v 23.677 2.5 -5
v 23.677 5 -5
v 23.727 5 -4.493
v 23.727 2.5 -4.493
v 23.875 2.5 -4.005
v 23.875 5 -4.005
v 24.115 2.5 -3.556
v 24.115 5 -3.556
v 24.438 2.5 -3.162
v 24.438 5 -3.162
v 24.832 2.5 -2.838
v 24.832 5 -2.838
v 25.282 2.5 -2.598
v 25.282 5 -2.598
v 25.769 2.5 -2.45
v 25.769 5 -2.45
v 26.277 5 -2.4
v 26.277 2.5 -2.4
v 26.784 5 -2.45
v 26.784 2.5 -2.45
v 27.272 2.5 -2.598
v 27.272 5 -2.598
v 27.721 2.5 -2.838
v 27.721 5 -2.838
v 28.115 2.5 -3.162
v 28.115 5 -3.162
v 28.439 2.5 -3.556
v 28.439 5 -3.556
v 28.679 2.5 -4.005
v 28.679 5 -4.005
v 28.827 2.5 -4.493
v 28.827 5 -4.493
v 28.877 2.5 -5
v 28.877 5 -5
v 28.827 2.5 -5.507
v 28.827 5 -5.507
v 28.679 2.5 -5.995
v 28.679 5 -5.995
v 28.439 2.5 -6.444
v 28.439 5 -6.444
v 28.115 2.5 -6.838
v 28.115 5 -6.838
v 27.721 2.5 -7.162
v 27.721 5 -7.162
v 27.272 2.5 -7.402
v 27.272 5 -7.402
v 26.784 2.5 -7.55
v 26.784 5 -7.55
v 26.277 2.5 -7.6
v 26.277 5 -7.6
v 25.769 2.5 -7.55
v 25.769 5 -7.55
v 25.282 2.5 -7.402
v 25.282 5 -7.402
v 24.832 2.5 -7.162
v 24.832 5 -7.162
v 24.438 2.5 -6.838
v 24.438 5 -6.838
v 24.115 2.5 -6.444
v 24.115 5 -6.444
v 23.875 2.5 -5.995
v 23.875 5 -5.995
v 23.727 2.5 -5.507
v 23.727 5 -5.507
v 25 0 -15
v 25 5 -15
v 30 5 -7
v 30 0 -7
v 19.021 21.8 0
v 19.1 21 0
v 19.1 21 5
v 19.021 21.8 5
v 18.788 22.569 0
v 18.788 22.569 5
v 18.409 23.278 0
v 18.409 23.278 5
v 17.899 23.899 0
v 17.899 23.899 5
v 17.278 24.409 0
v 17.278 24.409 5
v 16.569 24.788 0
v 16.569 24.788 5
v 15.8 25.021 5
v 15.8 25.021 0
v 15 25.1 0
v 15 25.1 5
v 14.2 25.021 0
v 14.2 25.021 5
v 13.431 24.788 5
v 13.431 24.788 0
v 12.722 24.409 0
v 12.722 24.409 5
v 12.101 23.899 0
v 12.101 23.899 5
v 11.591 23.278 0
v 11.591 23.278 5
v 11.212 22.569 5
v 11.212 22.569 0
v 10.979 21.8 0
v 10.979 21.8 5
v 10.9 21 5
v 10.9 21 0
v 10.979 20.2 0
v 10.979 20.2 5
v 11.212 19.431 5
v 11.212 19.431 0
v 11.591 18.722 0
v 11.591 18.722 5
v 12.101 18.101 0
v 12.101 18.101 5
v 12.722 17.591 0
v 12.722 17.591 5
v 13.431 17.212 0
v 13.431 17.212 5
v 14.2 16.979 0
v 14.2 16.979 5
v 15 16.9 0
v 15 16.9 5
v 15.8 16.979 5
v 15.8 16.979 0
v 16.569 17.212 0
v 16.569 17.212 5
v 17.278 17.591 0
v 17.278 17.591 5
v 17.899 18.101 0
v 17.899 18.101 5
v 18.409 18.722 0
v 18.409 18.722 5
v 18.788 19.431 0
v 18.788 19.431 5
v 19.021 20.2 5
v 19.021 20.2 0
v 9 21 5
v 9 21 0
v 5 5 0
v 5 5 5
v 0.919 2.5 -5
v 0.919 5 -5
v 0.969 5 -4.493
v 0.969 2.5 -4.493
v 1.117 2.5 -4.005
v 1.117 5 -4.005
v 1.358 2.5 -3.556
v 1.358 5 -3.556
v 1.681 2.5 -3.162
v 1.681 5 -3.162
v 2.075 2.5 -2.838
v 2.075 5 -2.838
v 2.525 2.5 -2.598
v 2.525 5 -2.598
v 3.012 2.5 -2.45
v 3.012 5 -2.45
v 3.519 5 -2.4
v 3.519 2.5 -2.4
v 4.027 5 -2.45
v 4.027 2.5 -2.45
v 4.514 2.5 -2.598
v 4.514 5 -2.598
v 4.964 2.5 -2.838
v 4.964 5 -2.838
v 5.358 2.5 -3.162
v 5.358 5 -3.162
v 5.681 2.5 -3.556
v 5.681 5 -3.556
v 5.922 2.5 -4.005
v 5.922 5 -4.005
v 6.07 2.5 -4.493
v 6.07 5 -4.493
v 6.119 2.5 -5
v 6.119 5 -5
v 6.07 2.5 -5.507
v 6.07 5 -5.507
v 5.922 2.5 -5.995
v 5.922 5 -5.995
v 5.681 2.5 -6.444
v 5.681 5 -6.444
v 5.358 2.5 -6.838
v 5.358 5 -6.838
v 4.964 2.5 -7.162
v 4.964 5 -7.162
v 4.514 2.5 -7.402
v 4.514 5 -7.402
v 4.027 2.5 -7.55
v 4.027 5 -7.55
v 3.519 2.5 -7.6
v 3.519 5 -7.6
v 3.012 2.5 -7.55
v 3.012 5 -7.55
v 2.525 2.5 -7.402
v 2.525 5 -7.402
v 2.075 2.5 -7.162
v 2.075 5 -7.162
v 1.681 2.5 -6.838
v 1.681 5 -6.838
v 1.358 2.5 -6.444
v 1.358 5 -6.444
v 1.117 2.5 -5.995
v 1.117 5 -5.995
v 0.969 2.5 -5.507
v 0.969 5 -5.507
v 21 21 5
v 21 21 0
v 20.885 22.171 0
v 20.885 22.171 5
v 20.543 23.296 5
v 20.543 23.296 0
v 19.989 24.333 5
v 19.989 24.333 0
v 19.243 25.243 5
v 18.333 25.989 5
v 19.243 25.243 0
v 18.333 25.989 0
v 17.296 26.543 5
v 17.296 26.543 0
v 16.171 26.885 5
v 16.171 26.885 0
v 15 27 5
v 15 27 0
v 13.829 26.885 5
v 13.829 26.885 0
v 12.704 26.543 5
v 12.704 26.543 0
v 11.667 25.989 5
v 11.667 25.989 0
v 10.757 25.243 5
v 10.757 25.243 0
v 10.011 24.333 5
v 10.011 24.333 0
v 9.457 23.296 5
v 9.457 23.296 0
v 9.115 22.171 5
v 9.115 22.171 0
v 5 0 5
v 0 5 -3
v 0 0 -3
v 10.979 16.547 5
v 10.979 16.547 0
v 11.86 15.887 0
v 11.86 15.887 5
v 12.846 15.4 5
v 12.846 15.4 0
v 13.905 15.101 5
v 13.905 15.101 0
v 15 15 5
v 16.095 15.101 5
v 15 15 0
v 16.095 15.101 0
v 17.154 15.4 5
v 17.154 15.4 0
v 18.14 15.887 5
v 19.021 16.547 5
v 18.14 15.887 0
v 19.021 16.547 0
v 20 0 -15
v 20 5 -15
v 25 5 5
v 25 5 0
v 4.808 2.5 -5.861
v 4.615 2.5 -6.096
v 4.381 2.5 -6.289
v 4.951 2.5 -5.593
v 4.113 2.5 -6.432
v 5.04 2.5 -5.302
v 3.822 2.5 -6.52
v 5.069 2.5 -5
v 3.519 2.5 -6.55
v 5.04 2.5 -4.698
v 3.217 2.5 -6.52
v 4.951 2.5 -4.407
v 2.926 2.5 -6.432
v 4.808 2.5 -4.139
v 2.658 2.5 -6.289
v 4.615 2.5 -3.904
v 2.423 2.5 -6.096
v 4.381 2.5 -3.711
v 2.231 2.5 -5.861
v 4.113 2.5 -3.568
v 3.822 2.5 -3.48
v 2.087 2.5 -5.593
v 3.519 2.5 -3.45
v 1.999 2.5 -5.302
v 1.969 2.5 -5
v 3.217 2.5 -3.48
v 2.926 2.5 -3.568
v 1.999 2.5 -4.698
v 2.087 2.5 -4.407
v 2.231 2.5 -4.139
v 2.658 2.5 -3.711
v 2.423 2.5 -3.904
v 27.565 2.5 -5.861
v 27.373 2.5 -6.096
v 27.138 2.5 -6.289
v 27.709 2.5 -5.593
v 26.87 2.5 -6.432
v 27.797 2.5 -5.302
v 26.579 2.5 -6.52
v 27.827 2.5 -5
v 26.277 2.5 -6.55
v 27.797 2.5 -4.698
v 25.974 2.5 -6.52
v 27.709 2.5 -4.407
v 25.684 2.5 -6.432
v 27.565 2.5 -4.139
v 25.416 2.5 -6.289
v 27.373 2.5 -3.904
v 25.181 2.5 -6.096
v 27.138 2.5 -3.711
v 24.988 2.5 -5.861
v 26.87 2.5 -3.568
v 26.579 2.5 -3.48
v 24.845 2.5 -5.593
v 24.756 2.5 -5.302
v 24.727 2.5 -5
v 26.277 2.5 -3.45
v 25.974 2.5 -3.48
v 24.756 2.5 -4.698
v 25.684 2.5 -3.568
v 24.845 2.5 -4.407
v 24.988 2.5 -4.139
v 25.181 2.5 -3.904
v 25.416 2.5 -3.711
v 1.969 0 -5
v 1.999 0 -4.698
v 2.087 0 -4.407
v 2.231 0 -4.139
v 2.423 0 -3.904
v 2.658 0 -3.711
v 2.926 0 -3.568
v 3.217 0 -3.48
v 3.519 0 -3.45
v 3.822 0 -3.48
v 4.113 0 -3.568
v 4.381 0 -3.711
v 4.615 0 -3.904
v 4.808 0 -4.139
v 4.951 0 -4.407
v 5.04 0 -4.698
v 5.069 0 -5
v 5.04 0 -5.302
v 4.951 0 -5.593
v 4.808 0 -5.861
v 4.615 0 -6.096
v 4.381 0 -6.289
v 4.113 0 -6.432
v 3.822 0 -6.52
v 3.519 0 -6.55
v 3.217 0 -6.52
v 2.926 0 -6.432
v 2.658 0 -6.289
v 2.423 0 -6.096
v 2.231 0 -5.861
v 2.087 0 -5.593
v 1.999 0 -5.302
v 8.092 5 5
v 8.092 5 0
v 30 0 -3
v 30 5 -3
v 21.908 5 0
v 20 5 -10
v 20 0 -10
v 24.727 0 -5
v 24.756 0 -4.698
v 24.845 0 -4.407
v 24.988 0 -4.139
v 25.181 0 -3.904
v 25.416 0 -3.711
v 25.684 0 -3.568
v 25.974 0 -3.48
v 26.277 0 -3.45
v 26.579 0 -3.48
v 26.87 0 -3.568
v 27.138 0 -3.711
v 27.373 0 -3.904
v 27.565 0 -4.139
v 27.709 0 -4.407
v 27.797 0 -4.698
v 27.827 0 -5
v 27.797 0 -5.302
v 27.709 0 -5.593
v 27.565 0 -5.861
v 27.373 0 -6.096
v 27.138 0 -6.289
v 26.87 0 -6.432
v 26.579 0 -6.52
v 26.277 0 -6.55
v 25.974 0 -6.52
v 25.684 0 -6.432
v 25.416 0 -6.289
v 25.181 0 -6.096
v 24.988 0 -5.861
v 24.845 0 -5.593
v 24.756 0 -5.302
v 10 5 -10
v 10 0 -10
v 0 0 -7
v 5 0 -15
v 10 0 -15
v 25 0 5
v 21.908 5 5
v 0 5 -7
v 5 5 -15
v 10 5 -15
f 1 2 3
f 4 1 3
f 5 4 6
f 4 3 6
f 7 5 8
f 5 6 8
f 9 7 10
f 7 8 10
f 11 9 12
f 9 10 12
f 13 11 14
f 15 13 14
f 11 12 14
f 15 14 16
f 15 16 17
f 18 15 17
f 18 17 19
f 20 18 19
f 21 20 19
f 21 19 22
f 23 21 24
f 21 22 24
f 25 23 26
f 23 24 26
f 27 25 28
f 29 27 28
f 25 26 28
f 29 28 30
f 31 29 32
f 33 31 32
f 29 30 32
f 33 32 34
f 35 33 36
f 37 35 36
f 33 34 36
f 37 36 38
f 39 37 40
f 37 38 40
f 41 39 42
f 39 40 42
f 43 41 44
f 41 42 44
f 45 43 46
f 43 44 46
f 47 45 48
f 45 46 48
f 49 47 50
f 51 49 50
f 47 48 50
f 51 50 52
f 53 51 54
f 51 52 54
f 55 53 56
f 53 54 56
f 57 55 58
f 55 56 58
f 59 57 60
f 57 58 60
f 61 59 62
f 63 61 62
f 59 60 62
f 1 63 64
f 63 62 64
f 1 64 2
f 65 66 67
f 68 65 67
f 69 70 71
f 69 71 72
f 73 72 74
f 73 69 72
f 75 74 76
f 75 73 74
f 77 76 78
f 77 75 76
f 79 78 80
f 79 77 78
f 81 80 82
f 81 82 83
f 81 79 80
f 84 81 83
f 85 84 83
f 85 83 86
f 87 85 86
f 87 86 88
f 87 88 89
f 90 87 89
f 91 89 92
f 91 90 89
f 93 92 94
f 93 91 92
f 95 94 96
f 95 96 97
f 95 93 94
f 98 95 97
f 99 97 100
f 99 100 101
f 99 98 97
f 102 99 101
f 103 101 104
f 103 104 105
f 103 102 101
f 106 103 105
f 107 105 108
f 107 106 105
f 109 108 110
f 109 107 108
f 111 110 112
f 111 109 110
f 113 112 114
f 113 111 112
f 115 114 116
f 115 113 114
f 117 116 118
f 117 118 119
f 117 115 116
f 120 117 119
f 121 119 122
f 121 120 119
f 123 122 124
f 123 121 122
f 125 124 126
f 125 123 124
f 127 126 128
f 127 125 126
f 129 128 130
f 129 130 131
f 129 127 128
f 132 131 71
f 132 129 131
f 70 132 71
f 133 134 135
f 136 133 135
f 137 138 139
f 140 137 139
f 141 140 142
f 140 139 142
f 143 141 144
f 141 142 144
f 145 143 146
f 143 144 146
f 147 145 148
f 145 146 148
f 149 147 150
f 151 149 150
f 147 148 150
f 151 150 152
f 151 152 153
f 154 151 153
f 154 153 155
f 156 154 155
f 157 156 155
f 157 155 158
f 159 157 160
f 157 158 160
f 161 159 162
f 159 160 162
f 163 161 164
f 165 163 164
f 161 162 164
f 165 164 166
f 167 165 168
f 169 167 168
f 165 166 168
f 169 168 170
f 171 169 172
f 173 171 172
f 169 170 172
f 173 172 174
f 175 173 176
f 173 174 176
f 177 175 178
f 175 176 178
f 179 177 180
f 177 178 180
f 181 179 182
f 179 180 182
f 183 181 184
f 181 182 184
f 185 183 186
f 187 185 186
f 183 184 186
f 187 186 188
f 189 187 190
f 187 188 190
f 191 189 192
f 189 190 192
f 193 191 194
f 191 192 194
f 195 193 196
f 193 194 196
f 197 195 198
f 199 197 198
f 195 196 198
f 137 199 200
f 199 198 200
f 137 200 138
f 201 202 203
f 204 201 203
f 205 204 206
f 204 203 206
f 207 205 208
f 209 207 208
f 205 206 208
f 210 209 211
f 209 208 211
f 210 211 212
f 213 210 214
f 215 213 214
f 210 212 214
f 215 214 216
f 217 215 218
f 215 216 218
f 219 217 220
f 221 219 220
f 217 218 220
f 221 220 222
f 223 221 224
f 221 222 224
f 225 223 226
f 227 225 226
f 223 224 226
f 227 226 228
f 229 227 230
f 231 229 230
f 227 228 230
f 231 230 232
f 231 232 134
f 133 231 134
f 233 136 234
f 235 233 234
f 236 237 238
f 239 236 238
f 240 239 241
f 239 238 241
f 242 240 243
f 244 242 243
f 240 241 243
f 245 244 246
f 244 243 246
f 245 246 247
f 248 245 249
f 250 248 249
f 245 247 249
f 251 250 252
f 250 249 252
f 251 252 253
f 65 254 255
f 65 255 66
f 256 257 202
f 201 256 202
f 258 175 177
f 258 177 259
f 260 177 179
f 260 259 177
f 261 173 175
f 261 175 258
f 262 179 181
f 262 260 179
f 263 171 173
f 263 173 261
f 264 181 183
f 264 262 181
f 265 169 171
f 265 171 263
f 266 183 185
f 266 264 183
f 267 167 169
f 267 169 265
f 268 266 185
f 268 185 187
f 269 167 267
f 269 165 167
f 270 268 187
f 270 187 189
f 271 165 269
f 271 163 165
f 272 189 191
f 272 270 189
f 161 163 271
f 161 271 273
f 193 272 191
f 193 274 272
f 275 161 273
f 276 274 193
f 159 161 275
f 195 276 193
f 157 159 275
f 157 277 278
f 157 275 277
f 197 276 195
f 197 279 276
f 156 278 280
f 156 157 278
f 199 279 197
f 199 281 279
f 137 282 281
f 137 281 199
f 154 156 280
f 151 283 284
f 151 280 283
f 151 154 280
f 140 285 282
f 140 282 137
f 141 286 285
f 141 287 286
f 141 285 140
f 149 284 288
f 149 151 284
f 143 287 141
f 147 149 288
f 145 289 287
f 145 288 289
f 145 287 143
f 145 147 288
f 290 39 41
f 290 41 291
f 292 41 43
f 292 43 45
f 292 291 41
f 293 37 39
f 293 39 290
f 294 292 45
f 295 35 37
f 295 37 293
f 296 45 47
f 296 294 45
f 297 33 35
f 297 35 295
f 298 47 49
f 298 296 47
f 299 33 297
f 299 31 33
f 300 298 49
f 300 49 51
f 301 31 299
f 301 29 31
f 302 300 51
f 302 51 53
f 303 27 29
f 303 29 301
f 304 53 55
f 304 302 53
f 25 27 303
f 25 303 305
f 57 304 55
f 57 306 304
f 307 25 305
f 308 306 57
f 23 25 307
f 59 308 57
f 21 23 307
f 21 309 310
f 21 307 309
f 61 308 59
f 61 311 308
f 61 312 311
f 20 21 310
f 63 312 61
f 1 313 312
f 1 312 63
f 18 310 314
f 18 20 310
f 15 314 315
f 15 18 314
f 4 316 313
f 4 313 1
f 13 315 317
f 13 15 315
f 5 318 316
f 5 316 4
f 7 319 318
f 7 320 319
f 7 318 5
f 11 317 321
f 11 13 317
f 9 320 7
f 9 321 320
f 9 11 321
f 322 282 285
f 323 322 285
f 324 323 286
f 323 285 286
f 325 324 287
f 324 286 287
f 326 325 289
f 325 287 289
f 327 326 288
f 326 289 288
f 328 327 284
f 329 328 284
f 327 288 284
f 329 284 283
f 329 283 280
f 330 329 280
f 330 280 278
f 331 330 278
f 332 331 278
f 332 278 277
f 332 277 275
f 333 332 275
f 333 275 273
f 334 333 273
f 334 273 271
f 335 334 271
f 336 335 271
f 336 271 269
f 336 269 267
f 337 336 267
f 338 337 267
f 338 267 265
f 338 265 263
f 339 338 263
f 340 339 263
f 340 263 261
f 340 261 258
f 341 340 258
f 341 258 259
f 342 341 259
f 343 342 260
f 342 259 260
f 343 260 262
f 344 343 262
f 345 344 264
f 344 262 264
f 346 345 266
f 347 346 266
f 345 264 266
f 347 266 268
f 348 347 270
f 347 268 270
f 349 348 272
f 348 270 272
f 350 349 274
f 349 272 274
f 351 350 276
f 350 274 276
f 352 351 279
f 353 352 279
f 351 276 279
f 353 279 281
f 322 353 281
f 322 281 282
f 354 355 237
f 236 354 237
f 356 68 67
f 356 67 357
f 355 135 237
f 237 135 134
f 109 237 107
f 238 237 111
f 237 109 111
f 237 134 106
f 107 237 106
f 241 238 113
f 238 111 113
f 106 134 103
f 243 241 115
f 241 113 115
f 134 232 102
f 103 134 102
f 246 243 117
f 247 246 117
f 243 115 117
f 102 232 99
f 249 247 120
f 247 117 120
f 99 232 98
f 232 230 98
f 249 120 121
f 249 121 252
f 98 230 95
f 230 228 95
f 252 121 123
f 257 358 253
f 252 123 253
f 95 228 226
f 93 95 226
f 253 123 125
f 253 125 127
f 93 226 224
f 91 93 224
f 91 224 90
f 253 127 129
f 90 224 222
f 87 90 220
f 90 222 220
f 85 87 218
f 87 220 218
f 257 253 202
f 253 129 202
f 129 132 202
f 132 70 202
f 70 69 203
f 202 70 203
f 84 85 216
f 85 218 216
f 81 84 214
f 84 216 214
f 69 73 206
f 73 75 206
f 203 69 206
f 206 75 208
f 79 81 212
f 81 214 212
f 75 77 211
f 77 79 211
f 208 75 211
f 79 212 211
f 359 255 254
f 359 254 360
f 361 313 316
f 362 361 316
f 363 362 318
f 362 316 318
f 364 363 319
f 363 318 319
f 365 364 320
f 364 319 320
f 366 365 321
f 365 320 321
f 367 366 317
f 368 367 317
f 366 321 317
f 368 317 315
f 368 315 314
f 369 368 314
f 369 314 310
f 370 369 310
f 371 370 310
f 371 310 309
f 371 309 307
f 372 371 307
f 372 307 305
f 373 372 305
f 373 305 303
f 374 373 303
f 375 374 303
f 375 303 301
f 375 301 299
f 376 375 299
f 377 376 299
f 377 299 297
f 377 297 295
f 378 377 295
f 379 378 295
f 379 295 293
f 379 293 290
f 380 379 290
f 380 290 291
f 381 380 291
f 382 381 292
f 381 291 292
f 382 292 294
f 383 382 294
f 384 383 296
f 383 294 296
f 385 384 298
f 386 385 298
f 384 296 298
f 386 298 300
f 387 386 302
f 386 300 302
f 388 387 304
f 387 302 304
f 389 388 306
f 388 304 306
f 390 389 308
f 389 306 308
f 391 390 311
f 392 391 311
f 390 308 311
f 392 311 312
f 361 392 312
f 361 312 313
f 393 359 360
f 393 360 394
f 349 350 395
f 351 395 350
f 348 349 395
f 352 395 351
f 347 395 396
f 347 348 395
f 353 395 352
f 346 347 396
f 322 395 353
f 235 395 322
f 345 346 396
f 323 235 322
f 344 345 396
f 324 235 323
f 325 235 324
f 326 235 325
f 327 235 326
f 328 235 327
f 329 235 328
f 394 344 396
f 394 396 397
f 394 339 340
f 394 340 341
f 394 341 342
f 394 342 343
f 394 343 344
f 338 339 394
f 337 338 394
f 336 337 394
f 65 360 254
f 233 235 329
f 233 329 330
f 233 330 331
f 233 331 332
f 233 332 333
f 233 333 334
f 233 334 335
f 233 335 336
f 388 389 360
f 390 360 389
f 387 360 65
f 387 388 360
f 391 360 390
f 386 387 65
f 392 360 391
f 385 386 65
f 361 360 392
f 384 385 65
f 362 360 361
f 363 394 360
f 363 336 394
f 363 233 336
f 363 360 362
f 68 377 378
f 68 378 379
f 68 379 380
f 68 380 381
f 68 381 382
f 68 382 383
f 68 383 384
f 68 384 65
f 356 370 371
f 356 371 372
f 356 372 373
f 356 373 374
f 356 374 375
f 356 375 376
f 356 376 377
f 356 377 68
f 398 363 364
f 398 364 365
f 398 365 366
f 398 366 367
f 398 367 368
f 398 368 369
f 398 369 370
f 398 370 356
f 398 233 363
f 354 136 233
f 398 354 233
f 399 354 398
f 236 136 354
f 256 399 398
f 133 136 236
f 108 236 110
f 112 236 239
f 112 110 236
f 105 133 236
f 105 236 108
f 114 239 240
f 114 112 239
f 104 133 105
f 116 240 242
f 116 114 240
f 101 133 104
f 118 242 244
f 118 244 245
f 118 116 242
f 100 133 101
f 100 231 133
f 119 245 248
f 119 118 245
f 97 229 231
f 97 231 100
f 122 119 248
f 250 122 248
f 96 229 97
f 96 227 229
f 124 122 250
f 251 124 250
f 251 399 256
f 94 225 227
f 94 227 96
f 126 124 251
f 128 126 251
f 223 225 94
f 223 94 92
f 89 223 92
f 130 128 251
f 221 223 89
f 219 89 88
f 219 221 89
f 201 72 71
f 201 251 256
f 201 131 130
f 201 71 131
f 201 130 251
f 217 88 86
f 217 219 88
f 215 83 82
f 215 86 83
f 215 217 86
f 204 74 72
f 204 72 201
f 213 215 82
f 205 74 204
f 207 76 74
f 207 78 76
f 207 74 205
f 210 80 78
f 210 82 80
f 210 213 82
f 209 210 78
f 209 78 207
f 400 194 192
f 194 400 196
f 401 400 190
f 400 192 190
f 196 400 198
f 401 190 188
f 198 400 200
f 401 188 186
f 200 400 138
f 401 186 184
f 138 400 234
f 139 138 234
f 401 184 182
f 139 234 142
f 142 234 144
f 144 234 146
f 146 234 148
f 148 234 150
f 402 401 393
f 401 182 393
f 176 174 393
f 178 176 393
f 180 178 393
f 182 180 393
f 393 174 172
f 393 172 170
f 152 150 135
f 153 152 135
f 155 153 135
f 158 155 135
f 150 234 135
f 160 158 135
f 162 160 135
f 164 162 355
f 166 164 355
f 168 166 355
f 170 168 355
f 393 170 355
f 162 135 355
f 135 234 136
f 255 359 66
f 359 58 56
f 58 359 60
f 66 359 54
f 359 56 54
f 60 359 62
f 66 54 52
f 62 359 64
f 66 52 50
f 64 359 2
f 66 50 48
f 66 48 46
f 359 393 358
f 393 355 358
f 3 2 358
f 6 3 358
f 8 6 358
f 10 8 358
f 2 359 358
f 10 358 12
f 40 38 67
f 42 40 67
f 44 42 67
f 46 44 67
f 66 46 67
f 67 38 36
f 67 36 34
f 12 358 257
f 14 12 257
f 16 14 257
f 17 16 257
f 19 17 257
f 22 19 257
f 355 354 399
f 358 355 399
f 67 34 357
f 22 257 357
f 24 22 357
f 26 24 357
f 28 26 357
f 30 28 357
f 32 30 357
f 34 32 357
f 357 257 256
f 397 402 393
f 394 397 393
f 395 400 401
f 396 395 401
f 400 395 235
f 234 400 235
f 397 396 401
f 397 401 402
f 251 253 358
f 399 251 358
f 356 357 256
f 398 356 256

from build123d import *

# Parameters (mm, degrees)
F0_R     = 4.1
F1_DEPTH = 5
F2_W     = 30
F2_H     = 20
F3_DEPTH = 5
F4_R     = 1.55
F4_W     = 10
F4_H     = 5
F5_DEPTH = 5
F6_R     = 2.6
F7_DEPTH = 2.5


with BuildPart() as f1:
    # F0 (on Top) → F1 (new body)
    with BuildSketch(Plane.XY):
        with BuildLine():
            Line((0, 5), (0, 0))
            Line((0, 0), (30, 0))
            Line((30, 0), (30, 5))
            Line((30, 5), (25, 5))
            Line((25, 5), (21, 21))
            ThreePointArc((21, 21), (15, 27), (9, 21))
            Line((9, 21), (5, 5))
            Line((5, 5), (0, 5))
        make_face()
        with BuildLine():
            Line((8.092329, 5), (10.979011, 16.546726))
            ThreePointArc((10.979011, 16.546726), (15, 15), (19.020989, 16.546726))
            Line((19.020989, 16.546726), (21.907671, 5))
            Line((21.907671, 5), (8.092329, 5))
        make_face(mode=Mode.SUBTRACT)
        with Locations((15, 21)):
            Circle(F0_R, mode=Mode.SUBTRACT)
    extrude(amount=F1_DEPTH)

    # F2 (on face) → F3 (join)
    with BuildSketch(Plane.XZ):
        with Locations((15, -5)):
            Rectangle(F2_W, F2_H)
    extrude(amount=-F3_DEPTH)

    # F4 (on face) → F5 (cut)
    with BuildSketch(Plane(origin=(0, 5, 0), x_dir=(-1, 0, 0), z_dir=(0, 1, 0))):
        with Locations((-26.27668, -5)):
            Circle(F4_R)
        with Locations((-3.519477, -5)):
            Circle(F4_R)
        Polygon((-30, -3), (-25, 5), (-30, 5), align=None)
        Polygon((0, -3), (0, 5), (-5, 5), align=None)
        Polygon((-30, -15), (-25, -15), (-30, -7), align=None)
        Polygon((-5, -15), (0, -15), (0, -7), align=None)
        with Locations((-15, -12.5)):
            Rectangle(F4_W, F4_H)
    extrude(amount=-F5_DEPTH, mode=Mode.SUBTRACT)

    # F6 (on face) → F7 (cut)
    with BuildSketch(Plane(origin=(0, 5, 0), x_dir=(-1, 0, 0), z_dir=(0, 1, 0))):
        with Locations((-26.27668, -5)):
            Circle(F6_R)
        with Locations((-3.519477, -5)):
            Circle(F6_R)
    extrude(amount=-F7_DEPTH, mode=Mode.SUBTRACT)


solid = f1.part
